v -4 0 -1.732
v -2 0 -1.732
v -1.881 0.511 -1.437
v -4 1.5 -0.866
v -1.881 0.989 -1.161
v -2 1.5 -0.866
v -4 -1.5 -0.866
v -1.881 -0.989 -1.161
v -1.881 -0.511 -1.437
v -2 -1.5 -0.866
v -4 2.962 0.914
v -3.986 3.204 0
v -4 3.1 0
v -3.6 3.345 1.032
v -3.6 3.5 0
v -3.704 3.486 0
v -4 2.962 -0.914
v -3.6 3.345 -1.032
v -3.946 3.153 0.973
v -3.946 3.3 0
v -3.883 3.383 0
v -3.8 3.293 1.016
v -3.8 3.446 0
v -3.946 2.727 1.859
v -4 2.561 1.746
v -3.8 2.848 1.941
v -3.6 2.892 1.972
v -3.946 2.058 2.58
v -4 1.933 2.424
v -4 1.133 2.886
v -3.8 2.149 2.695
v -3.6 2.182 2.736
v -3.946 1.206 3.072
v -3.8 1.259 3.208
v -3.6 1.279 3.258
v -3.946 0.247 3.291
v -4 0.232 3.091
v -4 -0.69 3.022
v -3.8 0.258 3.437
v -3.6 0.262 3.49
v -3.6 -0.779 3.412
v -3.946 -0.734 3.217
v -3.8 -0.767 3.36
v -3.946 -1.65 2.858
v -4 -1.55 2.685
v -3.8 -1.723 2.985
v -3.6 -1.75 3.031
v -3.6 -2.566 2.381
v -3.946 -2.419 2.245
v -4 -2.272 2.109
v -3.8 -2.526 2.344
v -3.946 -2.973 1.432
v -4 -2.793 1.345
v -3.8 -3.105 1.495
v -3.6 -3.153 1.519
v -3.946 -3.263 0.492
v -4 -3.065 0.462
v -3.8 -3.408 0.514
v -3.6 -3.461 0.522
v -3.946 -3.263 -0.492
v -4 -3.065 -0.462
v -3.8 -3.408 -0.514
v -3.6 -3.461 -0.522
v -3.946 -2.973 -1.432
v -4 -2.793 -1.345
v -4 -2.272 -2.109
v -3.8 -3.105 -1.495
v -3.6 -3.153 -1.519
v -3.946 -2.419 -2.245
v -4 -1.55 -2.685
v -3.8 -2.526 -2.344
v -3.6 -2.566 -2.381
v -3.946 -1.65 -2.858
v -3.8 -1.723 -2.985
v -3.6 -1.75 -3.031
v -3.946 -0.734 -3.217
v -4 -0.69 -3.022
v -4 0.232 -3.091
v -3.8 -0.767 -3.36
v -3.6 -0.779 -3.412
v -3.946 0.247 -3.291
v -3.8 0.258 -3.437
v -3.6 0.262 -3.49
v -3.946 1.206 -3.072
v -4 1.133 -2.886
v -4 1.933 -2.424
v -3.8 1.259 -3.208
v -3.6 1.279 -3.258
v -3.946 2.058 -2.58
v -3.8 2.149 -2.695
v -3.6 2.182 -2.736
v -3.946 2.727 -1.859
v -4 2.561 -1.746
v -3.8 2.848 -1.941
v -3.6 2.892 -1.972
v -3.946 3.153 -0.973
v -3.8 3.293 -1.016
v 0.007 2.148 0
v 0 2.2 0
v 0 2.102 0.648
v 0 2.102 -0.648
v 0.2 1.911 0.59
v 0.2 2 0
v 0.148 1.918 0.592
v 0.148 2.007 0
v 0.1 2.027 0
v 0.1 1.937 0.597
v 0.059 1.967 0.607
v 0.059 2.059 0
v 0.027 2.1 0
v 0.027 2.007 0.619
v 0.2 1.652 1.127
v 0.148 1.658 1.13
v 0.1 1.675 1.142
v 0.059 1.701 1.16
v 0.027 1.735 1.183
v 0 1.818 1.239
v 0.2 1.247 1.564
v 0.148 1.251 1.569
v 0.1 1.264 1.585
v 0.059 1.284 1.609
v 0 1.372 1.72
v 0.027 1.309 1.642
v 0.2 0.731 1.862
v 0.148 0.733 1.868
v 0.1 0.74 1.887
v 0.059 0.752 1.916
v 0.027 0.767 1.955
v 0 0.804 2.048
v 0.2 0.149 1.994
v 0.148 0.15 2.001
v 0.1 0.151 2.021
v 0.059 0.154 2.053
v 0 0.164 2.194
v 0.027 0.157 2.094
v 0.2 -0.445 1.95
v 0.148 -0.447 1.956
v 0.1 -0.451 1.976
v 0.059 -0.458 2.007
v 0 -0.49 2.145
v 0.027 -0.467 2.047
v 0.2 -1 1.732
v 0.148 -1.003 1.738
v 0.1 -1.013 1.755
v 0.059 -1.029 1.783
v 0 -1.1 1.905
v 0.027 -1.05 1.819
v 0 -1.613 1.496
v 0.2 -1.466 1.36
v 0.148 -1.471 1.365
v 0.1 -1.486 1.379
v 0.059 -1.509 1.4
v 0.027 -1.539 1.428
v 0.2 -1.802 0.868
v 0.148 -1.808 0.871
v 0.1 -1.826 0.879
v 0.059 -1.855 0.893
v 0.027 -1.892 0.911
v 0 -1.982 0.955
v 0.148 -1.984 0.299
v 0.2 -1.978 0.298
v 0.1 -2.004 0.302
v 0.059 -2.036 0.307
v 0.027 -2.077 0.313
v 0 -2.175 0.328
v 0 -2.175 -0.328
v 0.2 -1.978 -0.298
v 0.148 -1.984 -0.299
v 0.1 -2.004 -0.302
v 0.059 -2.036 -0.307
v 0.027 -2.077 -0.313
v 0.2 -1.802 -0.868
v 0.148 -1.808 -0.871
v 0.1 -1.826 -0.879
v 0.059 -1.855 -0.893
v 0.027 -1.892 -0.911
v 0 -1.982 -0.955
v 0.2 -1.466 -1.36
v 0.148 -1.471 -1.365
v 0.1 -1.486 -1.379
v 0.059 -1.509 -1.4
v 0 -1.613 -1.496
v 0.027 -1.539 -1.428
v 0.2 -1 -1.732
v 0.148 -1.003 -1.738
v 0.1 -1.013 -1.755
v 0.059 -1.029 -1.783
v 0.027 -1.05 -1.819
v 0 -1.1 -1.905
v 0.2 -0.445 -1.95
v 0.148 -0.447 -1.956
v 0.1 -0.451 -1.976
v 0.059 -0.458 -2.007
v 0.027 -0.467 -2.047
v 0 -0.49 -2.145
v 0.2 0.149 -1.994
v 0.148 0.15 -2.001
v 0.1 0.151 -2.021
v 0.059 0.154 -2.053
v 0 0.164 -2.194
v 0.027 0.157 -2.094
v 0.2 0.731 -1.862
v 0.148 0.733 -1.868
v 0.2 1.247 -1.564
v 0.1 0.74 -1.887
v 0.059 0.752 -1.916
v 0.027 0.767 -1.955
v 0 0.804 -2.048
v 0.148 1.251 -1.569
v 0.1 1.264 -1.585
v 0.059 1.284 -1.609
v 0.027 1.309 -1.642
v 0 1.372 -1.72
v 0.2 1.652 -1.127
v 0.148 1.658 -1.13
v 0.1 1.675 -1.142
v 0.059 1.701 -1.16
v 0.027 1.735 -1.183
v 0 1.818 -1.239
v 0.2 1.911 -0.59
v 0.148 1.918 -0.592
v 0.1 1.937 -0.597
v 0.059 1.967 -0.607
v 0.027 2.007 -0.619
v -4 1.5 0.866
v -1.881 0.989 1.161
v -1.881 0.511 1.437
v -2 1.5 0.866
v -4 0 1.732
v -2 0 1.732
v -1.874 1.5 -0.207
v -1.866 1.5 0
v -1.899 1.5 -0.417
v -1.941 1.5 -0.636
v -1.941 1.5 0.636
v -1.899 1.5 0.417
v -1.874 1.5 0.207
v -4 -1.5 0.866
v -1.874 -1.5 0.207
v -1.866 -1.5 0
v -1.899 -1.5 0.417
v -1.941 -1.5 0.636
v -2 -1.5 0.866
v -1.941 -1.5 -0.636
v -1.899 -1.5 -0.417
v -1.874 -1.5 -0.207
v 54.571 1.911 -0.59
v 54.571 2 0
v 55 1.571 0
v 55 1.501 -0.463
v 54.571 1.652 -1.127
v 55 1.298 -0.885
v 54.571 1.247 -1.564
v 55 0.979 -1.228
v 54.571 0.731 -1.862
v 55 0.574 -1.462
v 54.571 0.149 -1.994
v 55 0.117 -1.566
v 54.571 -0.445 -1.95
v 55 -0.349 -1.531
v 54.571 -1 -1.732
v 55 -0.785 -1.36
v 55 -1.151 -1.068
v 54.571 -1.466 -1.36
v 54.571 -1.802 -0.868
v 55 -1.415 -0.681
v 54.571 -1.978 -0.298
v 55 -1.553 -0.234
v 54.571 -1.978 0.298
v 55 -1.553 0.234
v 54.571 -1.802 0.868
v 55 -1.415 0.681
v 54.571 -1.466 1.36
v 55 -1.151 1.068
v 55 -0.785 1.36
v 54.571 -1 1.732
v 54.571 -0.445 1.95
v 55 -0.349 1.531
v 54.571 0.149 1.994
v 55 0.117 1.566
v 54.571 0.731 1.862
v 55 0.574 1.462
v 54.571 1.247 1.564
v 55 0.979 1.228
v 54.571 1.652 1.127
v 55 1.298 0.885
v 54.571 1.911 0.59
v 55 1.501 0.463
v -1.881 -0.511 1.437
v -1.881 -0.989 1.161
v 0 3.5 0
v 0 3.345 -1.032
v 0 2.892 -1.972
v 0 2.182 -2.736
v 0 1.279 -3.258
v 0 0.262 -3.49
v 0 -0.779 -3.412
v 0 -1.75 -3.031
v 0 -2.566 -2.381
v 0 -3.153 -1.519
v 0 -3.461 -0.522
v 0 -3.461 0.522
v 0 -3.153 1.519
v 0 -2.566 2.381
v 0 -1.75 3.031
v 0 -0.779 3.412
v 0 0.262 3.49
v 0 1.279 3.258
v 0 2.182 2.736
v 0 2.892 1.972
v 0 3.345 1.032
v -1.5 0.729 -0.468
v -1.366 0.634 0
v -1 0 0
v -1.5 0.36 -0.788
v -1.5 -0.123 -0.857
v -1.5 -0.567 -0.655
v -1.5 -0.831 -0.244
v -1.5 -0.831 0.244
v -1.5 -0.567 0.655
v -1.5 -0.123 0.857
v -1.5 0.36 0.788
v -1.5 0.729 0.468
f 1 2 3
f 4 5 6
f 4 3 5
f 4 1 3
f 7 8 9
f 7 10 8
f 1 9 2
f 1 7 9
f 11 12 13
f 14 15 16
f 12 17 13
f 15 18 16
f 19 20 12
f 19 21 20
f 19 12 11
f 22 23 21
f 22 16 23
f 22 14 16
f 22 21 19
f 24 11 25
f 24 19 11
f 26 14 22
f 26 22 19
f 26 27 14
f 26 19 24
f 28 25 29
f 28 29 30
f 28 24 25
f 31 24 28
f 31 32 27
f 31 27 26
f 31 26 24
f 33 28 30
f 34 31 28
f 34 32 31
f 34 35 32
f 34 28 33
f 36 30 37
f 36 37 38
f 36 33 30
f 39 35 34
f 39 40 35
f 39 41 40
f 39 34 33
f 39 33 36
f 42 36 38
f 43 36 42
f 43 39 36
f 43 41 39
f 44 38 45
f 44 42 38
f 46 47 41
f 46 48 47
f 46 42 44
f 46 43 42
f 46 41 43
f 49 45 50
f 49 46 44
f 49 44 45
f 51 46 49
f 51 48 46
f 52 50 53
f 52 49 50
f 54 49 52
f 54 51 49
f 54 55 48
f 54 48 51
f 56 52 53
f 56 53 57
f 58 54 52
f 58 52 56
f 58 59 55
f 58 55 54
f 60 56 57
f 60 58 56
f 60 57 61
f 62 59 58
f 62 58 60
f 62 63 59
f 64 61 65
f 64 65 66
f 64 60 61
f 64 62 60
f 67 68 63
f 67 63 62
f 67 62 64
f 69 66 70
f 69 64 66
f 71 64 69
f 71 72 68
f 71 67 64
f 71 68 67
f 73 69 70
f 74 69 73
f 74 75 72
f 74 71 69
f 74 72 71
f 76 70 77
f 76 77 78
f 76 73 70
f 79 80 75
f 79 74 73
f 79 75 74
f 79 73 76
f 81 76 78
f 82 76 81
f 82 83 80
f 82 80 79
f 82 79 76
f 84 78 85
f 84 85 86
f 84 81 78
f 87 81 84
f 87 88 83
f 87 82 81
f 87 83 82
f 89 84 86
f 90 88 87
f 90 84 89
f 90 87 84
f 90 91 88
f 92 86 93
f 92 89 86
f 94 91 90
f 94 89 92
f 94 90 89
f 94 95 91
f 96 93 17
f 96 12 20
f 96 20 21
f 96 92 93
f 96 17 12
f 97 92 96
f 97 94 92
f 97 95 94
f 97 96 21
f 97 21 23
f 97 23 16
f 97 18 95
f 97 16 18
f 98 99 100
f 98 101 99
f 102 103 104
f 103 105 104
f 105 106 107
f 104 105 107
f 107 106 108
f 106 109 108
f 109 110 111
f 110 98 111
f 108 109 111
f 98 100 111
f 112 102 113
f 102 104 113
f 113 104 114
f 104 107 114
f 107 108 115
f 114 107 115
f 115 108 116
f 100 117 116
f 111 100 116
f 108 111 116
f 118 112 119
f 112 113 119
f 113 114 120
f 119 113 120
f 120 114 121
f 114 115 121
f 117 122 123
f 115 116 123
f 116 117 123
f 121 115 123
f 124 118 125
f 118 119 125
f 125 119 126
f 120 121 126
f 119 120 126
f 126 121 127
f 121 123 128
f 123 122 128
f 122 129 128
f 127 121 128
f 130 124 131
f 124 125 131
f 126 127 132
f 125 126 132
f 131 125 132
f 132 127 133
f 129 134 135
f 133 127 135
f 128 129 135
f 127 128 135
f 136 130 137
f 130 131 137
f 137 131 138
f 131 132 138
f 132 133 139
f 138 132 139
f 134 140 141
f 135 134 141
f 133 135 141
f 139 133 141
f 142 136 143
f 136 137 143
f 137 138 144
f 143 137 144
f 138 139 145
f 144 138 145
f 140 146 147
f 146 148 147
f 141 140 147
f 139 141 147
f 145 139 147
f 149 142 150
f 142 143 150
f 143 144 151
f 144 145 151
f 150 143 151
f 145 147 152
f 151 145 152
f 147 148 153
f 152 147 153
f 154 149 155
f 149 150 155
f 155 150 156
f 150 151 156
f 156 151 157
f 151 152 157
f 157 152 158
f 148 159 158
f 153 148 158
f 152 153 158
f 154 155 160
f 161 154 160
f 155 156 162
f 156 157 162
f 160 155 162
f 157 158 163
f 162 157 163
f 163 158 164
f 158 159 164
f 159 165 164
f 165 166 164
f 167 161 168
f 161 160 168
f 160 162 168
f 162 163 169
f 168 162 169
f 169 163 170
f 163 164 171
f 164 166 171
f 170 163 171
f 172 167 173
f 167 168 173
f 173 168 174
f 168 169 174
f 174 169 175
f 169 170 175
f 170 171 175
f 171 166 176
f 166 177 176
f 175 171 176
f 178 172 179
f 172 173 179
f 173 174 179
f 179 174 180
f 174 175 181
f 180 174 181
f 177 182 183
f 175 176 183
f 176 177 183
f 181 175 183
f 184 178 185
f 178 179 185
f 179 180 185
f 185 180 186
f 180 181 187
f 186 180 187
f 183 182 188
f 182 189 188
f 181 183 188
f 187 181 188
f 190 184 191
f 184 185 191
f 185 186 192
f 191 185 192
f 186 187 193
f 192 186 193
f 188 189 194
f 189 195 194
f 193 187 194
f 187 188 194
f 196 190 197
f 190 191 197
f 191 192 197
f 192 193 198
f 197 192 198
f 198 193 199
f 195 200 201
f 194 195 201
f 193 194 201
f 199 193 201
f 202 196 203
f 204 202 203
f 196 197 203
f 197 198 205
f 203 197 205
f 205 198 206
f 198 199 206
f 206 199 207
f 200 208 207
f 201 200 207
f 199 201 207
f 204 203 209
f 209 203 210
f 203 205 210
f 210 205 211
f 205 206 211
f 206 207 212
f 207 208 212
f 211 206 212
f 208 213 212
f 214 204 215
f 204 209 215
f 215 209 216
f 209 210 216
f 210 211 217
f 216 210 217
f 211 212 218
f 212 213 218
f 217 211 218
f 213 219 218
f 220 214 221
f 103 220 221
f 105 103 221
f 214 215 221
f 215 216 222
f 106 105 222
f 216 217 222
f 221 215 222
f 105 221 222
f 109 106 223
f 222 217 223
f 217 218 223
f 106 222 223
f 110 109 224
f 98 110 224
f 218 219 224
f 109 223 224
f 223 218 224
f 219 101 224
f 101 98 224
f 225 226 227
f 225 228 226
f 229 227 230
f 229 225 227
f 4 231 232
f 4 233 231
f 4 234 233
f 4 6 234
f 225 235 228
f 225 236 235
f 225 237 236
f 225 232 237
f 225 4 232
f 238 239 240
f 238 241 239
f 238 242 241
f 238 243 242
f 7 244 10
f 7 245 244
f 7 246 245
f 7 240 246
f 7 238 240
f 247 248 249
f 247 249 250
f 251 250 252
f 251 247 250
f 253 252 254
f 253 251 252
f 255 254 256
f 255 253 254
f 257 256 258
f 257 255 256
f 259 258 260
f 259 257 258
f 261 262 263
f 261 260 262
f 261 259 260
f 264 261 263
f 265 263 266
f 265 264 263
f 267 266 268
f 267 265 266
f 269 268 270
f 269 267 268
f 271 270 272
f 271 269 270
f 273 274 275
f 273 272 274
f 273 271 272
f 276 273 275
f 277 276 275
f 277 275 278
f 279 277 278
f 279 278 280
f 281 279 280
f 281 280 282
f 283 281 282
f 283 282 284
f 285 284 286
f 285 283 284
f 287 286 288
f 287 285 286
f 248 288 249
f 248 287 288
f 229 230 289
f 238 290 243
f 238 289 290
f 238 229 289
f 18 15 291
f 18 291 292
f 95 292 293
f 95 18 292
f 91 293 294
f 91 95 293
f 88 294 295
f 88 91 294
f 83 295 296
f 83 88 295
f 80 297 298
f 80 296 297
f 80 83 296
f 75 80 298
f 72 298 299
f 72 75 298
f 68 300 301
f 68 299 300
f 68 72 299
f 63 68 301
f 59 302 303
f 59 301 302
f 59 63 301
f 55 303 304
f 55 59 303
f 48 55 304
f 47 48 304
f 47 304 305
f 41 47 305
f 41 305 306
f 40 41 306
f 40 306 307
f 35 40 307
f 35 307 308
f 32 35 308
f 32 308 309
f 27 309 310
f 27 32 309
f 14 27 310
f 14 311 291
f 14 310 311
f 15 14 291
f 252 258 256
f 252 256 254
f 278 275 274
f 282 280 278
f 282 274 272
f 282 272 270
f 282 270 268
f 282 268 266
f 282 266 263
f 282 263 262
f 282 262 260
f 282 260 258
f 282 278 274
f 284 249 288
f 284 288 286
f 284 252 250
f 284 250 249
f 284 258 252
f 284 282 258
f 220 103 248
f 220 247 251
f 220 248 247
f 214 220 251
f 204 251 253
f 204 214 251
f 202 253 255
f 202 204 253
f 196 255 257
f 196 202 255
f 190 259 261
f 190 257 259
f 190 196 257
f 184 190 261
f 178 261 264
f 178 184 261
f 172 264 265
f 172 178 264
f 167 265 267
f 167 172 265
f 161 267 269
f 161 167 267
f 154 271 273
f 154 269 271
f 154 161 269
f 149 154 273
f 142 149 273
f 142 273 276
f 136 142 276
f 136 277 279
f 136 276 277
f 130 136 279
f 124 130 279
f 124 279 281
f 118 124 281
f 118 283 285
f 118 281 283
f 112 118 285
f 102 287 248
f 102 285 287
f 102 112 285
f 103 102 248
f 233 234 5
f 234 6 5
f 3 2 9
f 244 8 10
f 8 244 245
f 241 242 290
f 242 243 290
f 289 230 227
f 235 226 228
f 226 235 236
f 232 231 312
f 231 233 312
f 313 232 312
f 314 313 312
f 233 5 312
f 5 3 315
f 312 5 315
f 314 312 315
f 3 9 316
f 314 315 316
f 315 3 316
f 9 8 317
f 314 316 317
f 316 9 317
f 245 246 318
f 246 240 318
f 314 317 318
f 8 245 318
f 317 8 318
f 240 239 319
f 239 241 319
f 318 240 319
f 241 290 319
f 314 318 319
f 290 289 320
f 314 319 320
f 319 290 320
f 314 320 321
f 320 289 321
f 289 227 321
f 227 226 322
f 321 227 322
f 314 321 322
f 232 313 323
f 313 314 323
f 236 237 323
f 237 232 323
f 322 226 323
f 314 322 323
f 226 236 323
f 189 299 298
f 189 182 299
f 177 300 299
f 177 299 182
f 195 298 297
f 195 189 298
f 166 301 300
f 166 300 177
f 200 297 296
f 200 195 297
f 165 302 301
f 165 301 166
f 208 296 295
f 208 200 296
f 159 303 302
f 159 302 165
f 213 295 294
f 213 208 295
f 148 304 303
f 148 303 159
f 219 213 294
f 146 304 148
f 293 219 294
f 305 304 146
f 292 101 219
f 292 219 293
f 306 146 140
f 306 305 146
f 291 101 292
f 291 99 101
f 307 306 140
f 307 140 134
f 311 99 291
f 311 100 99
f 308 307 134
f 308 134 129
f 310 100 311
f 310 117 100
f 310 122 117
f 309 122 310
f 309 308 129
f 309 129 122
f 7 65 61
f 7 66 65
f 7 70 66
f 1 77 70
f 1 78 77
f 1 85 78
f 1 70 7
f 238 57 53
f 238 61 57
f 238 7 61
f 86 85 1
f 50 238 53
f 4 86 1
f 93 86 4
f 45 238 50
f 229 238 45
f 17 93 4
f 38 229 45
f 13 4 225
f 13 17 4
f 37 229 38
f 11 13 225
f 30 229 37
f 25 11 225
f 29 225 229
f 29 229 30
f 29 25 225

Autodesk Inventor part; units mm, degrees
ref_plane "YZ Plane" through (0, 0, 0) normal (1, 0, 0) x (0, 1, 0)
ref_plane "XZ Plane" through (0, 0, 0) normal (0, 1, 0) x (-1, 0, 0)
sketch "Skizze1" plane through (0, 0, 0) normal (0, 0, 1) x (1, 0, 0)
  line L0 (-1, 0) -> (55, 0)
  line L1 (55, 0) -> (55, 2)
  line L2 (55, 2) -> (25, 2)
  line L3 (25, 2) -> (24.5705, 2)
  line L4 (24.5705, 2) -> (0, 2)
  line L5 (0, 2) -> (0, 3.5)
  line L6 (0, 3.5) -> (-4, 3.5)
  line L7 (-4, 3.5) -> (-4, 1.7321)
  line L8 (-4, 1.7321) -> (-2, 1.7321)
  line L9 (-2, 1.7321) -> (-1, 0)
  line L10 (-14.8, 0) -> (60.8, 0) projected
  line L11 (0, -0.7) -> (0, 4.2) projected
  line L12 (25, 2) -> (0, 2) construction
  dimension "d1" = 30
  dimension "d2" = 0.4295
  dimension "d3" = 4
  dimension "d4" = 2
  dimension "d5" = 60
  dimension "d6" = 4
  dimension "d7" = 4
  dimension "d8" = 3.4641
  dimension "d9" = 7
  dimension "d26" = 55
revolve "Körper" add sketch "Skizze1" angle 360 about axis through (-1, 0, 0) along (1, 0, 0)
sketch "Skizze2" plane through (-4, 0, 0) normal (-1, 0, 0) x (0, 0, 1)
  circle A0 centre (0, 0) radius 1.7321 projected
  line L0 (0, -4.9) -> (0, 4.9) projected
  line L1 (-4.9, 0) -> (4.9, 0) projected
  line L2 (1.7321, 0) -> (0.866, -1.5)
  line L3 (0.866, -1.5) -> (-0.866, -1.5)
  line L4 (-0.866, -1.5) -> (-1.7321, 0)
  line L5 (-1.7321, 0) -> (-0.866, 1.5)
  line L6 (-0.866, 1.5) -> (0.866, 1.5)
  line L7 (0.866, 1.5) -> (1.7321, 0)
extrude "Loch" add sketch "Skizze2" against normal up to next contours L7 A0 | A0 L2 | L6 L0 A0 | A0 L0 L3 | L0 L6 A0 | A0 L3 L0 | L4 A0 | A0 L5
fillet "Rundung1" radius 0.4 1 edges at (-4, -3.5, 0)
thread "Gewinde" size "M4x0.7" class "6g" standard "ISO Metric profile" length 30
chamfer "Fase1" distance 0.4294 distance2 0.4294 1 edges at (55, -2, 0) measured on face at (55, -0.3567, 0.5168)
ref_plane "Work Plane1" through (29, 0, 0) normal (0, -1, 0) x (1, 0, 0)
fillet "Fillet2" radius 0.2 1 edges at (0, -2, 0)
equation "\"d1\" = GEL"
equation "\"d3\" = KOH"
equation "\"d4\" = INTI"
equation "\"d6\" = GD"
equation "\"d7\" = BDM"
equation "\"d8\" = 1.1547 * SW"
equation "\"d9\" = KOD"
equation "\"d26\" = NLG"
equation "\"d30\" = R"
equation "\"d17\" = RR"
equation "\"d13\" = GEL"
equation "\"d15\" = -0.5 * SPD + 0.5 * GD"
equation "\"d16\" = GUL"
equation "\"GD\" = NND"
equation "\"NLG\" = 55"
equation "\"GEL\" = 30"
equation "\"KOD\" = 7"
equation "\"KOH\" = 4"
equation "\"INTI\" = 2"
equation "\"GAL\" = 0.61345 * PTC"
equation "\"GUL\" = 0.61345 * PTC"
equation "\"BDM\" = NND"
equation "\"SW\" = 3"
equation "\"RR\" = 0.4"
equation "\"SPD\" = NND - 1.2269 * PTC"
equation "\"R\" = 0.2"
equation "\"TOA\" = 30deg"
equation "\"GD1\" = THREADDIA - 1.2269 * PTC"
equation "\"THREADDIA\" = 4"
equation "\"FAWI\" = 45deg"
equation "\"ANG\" = 120deg"
equation "\"PTC\" = 0.7"
equation "\"NND\" = 4"
equation "\"E0\" = 1.155 * SW"
properties part number "DIN 912 - M4 x 55" material "Stahl, weich"
